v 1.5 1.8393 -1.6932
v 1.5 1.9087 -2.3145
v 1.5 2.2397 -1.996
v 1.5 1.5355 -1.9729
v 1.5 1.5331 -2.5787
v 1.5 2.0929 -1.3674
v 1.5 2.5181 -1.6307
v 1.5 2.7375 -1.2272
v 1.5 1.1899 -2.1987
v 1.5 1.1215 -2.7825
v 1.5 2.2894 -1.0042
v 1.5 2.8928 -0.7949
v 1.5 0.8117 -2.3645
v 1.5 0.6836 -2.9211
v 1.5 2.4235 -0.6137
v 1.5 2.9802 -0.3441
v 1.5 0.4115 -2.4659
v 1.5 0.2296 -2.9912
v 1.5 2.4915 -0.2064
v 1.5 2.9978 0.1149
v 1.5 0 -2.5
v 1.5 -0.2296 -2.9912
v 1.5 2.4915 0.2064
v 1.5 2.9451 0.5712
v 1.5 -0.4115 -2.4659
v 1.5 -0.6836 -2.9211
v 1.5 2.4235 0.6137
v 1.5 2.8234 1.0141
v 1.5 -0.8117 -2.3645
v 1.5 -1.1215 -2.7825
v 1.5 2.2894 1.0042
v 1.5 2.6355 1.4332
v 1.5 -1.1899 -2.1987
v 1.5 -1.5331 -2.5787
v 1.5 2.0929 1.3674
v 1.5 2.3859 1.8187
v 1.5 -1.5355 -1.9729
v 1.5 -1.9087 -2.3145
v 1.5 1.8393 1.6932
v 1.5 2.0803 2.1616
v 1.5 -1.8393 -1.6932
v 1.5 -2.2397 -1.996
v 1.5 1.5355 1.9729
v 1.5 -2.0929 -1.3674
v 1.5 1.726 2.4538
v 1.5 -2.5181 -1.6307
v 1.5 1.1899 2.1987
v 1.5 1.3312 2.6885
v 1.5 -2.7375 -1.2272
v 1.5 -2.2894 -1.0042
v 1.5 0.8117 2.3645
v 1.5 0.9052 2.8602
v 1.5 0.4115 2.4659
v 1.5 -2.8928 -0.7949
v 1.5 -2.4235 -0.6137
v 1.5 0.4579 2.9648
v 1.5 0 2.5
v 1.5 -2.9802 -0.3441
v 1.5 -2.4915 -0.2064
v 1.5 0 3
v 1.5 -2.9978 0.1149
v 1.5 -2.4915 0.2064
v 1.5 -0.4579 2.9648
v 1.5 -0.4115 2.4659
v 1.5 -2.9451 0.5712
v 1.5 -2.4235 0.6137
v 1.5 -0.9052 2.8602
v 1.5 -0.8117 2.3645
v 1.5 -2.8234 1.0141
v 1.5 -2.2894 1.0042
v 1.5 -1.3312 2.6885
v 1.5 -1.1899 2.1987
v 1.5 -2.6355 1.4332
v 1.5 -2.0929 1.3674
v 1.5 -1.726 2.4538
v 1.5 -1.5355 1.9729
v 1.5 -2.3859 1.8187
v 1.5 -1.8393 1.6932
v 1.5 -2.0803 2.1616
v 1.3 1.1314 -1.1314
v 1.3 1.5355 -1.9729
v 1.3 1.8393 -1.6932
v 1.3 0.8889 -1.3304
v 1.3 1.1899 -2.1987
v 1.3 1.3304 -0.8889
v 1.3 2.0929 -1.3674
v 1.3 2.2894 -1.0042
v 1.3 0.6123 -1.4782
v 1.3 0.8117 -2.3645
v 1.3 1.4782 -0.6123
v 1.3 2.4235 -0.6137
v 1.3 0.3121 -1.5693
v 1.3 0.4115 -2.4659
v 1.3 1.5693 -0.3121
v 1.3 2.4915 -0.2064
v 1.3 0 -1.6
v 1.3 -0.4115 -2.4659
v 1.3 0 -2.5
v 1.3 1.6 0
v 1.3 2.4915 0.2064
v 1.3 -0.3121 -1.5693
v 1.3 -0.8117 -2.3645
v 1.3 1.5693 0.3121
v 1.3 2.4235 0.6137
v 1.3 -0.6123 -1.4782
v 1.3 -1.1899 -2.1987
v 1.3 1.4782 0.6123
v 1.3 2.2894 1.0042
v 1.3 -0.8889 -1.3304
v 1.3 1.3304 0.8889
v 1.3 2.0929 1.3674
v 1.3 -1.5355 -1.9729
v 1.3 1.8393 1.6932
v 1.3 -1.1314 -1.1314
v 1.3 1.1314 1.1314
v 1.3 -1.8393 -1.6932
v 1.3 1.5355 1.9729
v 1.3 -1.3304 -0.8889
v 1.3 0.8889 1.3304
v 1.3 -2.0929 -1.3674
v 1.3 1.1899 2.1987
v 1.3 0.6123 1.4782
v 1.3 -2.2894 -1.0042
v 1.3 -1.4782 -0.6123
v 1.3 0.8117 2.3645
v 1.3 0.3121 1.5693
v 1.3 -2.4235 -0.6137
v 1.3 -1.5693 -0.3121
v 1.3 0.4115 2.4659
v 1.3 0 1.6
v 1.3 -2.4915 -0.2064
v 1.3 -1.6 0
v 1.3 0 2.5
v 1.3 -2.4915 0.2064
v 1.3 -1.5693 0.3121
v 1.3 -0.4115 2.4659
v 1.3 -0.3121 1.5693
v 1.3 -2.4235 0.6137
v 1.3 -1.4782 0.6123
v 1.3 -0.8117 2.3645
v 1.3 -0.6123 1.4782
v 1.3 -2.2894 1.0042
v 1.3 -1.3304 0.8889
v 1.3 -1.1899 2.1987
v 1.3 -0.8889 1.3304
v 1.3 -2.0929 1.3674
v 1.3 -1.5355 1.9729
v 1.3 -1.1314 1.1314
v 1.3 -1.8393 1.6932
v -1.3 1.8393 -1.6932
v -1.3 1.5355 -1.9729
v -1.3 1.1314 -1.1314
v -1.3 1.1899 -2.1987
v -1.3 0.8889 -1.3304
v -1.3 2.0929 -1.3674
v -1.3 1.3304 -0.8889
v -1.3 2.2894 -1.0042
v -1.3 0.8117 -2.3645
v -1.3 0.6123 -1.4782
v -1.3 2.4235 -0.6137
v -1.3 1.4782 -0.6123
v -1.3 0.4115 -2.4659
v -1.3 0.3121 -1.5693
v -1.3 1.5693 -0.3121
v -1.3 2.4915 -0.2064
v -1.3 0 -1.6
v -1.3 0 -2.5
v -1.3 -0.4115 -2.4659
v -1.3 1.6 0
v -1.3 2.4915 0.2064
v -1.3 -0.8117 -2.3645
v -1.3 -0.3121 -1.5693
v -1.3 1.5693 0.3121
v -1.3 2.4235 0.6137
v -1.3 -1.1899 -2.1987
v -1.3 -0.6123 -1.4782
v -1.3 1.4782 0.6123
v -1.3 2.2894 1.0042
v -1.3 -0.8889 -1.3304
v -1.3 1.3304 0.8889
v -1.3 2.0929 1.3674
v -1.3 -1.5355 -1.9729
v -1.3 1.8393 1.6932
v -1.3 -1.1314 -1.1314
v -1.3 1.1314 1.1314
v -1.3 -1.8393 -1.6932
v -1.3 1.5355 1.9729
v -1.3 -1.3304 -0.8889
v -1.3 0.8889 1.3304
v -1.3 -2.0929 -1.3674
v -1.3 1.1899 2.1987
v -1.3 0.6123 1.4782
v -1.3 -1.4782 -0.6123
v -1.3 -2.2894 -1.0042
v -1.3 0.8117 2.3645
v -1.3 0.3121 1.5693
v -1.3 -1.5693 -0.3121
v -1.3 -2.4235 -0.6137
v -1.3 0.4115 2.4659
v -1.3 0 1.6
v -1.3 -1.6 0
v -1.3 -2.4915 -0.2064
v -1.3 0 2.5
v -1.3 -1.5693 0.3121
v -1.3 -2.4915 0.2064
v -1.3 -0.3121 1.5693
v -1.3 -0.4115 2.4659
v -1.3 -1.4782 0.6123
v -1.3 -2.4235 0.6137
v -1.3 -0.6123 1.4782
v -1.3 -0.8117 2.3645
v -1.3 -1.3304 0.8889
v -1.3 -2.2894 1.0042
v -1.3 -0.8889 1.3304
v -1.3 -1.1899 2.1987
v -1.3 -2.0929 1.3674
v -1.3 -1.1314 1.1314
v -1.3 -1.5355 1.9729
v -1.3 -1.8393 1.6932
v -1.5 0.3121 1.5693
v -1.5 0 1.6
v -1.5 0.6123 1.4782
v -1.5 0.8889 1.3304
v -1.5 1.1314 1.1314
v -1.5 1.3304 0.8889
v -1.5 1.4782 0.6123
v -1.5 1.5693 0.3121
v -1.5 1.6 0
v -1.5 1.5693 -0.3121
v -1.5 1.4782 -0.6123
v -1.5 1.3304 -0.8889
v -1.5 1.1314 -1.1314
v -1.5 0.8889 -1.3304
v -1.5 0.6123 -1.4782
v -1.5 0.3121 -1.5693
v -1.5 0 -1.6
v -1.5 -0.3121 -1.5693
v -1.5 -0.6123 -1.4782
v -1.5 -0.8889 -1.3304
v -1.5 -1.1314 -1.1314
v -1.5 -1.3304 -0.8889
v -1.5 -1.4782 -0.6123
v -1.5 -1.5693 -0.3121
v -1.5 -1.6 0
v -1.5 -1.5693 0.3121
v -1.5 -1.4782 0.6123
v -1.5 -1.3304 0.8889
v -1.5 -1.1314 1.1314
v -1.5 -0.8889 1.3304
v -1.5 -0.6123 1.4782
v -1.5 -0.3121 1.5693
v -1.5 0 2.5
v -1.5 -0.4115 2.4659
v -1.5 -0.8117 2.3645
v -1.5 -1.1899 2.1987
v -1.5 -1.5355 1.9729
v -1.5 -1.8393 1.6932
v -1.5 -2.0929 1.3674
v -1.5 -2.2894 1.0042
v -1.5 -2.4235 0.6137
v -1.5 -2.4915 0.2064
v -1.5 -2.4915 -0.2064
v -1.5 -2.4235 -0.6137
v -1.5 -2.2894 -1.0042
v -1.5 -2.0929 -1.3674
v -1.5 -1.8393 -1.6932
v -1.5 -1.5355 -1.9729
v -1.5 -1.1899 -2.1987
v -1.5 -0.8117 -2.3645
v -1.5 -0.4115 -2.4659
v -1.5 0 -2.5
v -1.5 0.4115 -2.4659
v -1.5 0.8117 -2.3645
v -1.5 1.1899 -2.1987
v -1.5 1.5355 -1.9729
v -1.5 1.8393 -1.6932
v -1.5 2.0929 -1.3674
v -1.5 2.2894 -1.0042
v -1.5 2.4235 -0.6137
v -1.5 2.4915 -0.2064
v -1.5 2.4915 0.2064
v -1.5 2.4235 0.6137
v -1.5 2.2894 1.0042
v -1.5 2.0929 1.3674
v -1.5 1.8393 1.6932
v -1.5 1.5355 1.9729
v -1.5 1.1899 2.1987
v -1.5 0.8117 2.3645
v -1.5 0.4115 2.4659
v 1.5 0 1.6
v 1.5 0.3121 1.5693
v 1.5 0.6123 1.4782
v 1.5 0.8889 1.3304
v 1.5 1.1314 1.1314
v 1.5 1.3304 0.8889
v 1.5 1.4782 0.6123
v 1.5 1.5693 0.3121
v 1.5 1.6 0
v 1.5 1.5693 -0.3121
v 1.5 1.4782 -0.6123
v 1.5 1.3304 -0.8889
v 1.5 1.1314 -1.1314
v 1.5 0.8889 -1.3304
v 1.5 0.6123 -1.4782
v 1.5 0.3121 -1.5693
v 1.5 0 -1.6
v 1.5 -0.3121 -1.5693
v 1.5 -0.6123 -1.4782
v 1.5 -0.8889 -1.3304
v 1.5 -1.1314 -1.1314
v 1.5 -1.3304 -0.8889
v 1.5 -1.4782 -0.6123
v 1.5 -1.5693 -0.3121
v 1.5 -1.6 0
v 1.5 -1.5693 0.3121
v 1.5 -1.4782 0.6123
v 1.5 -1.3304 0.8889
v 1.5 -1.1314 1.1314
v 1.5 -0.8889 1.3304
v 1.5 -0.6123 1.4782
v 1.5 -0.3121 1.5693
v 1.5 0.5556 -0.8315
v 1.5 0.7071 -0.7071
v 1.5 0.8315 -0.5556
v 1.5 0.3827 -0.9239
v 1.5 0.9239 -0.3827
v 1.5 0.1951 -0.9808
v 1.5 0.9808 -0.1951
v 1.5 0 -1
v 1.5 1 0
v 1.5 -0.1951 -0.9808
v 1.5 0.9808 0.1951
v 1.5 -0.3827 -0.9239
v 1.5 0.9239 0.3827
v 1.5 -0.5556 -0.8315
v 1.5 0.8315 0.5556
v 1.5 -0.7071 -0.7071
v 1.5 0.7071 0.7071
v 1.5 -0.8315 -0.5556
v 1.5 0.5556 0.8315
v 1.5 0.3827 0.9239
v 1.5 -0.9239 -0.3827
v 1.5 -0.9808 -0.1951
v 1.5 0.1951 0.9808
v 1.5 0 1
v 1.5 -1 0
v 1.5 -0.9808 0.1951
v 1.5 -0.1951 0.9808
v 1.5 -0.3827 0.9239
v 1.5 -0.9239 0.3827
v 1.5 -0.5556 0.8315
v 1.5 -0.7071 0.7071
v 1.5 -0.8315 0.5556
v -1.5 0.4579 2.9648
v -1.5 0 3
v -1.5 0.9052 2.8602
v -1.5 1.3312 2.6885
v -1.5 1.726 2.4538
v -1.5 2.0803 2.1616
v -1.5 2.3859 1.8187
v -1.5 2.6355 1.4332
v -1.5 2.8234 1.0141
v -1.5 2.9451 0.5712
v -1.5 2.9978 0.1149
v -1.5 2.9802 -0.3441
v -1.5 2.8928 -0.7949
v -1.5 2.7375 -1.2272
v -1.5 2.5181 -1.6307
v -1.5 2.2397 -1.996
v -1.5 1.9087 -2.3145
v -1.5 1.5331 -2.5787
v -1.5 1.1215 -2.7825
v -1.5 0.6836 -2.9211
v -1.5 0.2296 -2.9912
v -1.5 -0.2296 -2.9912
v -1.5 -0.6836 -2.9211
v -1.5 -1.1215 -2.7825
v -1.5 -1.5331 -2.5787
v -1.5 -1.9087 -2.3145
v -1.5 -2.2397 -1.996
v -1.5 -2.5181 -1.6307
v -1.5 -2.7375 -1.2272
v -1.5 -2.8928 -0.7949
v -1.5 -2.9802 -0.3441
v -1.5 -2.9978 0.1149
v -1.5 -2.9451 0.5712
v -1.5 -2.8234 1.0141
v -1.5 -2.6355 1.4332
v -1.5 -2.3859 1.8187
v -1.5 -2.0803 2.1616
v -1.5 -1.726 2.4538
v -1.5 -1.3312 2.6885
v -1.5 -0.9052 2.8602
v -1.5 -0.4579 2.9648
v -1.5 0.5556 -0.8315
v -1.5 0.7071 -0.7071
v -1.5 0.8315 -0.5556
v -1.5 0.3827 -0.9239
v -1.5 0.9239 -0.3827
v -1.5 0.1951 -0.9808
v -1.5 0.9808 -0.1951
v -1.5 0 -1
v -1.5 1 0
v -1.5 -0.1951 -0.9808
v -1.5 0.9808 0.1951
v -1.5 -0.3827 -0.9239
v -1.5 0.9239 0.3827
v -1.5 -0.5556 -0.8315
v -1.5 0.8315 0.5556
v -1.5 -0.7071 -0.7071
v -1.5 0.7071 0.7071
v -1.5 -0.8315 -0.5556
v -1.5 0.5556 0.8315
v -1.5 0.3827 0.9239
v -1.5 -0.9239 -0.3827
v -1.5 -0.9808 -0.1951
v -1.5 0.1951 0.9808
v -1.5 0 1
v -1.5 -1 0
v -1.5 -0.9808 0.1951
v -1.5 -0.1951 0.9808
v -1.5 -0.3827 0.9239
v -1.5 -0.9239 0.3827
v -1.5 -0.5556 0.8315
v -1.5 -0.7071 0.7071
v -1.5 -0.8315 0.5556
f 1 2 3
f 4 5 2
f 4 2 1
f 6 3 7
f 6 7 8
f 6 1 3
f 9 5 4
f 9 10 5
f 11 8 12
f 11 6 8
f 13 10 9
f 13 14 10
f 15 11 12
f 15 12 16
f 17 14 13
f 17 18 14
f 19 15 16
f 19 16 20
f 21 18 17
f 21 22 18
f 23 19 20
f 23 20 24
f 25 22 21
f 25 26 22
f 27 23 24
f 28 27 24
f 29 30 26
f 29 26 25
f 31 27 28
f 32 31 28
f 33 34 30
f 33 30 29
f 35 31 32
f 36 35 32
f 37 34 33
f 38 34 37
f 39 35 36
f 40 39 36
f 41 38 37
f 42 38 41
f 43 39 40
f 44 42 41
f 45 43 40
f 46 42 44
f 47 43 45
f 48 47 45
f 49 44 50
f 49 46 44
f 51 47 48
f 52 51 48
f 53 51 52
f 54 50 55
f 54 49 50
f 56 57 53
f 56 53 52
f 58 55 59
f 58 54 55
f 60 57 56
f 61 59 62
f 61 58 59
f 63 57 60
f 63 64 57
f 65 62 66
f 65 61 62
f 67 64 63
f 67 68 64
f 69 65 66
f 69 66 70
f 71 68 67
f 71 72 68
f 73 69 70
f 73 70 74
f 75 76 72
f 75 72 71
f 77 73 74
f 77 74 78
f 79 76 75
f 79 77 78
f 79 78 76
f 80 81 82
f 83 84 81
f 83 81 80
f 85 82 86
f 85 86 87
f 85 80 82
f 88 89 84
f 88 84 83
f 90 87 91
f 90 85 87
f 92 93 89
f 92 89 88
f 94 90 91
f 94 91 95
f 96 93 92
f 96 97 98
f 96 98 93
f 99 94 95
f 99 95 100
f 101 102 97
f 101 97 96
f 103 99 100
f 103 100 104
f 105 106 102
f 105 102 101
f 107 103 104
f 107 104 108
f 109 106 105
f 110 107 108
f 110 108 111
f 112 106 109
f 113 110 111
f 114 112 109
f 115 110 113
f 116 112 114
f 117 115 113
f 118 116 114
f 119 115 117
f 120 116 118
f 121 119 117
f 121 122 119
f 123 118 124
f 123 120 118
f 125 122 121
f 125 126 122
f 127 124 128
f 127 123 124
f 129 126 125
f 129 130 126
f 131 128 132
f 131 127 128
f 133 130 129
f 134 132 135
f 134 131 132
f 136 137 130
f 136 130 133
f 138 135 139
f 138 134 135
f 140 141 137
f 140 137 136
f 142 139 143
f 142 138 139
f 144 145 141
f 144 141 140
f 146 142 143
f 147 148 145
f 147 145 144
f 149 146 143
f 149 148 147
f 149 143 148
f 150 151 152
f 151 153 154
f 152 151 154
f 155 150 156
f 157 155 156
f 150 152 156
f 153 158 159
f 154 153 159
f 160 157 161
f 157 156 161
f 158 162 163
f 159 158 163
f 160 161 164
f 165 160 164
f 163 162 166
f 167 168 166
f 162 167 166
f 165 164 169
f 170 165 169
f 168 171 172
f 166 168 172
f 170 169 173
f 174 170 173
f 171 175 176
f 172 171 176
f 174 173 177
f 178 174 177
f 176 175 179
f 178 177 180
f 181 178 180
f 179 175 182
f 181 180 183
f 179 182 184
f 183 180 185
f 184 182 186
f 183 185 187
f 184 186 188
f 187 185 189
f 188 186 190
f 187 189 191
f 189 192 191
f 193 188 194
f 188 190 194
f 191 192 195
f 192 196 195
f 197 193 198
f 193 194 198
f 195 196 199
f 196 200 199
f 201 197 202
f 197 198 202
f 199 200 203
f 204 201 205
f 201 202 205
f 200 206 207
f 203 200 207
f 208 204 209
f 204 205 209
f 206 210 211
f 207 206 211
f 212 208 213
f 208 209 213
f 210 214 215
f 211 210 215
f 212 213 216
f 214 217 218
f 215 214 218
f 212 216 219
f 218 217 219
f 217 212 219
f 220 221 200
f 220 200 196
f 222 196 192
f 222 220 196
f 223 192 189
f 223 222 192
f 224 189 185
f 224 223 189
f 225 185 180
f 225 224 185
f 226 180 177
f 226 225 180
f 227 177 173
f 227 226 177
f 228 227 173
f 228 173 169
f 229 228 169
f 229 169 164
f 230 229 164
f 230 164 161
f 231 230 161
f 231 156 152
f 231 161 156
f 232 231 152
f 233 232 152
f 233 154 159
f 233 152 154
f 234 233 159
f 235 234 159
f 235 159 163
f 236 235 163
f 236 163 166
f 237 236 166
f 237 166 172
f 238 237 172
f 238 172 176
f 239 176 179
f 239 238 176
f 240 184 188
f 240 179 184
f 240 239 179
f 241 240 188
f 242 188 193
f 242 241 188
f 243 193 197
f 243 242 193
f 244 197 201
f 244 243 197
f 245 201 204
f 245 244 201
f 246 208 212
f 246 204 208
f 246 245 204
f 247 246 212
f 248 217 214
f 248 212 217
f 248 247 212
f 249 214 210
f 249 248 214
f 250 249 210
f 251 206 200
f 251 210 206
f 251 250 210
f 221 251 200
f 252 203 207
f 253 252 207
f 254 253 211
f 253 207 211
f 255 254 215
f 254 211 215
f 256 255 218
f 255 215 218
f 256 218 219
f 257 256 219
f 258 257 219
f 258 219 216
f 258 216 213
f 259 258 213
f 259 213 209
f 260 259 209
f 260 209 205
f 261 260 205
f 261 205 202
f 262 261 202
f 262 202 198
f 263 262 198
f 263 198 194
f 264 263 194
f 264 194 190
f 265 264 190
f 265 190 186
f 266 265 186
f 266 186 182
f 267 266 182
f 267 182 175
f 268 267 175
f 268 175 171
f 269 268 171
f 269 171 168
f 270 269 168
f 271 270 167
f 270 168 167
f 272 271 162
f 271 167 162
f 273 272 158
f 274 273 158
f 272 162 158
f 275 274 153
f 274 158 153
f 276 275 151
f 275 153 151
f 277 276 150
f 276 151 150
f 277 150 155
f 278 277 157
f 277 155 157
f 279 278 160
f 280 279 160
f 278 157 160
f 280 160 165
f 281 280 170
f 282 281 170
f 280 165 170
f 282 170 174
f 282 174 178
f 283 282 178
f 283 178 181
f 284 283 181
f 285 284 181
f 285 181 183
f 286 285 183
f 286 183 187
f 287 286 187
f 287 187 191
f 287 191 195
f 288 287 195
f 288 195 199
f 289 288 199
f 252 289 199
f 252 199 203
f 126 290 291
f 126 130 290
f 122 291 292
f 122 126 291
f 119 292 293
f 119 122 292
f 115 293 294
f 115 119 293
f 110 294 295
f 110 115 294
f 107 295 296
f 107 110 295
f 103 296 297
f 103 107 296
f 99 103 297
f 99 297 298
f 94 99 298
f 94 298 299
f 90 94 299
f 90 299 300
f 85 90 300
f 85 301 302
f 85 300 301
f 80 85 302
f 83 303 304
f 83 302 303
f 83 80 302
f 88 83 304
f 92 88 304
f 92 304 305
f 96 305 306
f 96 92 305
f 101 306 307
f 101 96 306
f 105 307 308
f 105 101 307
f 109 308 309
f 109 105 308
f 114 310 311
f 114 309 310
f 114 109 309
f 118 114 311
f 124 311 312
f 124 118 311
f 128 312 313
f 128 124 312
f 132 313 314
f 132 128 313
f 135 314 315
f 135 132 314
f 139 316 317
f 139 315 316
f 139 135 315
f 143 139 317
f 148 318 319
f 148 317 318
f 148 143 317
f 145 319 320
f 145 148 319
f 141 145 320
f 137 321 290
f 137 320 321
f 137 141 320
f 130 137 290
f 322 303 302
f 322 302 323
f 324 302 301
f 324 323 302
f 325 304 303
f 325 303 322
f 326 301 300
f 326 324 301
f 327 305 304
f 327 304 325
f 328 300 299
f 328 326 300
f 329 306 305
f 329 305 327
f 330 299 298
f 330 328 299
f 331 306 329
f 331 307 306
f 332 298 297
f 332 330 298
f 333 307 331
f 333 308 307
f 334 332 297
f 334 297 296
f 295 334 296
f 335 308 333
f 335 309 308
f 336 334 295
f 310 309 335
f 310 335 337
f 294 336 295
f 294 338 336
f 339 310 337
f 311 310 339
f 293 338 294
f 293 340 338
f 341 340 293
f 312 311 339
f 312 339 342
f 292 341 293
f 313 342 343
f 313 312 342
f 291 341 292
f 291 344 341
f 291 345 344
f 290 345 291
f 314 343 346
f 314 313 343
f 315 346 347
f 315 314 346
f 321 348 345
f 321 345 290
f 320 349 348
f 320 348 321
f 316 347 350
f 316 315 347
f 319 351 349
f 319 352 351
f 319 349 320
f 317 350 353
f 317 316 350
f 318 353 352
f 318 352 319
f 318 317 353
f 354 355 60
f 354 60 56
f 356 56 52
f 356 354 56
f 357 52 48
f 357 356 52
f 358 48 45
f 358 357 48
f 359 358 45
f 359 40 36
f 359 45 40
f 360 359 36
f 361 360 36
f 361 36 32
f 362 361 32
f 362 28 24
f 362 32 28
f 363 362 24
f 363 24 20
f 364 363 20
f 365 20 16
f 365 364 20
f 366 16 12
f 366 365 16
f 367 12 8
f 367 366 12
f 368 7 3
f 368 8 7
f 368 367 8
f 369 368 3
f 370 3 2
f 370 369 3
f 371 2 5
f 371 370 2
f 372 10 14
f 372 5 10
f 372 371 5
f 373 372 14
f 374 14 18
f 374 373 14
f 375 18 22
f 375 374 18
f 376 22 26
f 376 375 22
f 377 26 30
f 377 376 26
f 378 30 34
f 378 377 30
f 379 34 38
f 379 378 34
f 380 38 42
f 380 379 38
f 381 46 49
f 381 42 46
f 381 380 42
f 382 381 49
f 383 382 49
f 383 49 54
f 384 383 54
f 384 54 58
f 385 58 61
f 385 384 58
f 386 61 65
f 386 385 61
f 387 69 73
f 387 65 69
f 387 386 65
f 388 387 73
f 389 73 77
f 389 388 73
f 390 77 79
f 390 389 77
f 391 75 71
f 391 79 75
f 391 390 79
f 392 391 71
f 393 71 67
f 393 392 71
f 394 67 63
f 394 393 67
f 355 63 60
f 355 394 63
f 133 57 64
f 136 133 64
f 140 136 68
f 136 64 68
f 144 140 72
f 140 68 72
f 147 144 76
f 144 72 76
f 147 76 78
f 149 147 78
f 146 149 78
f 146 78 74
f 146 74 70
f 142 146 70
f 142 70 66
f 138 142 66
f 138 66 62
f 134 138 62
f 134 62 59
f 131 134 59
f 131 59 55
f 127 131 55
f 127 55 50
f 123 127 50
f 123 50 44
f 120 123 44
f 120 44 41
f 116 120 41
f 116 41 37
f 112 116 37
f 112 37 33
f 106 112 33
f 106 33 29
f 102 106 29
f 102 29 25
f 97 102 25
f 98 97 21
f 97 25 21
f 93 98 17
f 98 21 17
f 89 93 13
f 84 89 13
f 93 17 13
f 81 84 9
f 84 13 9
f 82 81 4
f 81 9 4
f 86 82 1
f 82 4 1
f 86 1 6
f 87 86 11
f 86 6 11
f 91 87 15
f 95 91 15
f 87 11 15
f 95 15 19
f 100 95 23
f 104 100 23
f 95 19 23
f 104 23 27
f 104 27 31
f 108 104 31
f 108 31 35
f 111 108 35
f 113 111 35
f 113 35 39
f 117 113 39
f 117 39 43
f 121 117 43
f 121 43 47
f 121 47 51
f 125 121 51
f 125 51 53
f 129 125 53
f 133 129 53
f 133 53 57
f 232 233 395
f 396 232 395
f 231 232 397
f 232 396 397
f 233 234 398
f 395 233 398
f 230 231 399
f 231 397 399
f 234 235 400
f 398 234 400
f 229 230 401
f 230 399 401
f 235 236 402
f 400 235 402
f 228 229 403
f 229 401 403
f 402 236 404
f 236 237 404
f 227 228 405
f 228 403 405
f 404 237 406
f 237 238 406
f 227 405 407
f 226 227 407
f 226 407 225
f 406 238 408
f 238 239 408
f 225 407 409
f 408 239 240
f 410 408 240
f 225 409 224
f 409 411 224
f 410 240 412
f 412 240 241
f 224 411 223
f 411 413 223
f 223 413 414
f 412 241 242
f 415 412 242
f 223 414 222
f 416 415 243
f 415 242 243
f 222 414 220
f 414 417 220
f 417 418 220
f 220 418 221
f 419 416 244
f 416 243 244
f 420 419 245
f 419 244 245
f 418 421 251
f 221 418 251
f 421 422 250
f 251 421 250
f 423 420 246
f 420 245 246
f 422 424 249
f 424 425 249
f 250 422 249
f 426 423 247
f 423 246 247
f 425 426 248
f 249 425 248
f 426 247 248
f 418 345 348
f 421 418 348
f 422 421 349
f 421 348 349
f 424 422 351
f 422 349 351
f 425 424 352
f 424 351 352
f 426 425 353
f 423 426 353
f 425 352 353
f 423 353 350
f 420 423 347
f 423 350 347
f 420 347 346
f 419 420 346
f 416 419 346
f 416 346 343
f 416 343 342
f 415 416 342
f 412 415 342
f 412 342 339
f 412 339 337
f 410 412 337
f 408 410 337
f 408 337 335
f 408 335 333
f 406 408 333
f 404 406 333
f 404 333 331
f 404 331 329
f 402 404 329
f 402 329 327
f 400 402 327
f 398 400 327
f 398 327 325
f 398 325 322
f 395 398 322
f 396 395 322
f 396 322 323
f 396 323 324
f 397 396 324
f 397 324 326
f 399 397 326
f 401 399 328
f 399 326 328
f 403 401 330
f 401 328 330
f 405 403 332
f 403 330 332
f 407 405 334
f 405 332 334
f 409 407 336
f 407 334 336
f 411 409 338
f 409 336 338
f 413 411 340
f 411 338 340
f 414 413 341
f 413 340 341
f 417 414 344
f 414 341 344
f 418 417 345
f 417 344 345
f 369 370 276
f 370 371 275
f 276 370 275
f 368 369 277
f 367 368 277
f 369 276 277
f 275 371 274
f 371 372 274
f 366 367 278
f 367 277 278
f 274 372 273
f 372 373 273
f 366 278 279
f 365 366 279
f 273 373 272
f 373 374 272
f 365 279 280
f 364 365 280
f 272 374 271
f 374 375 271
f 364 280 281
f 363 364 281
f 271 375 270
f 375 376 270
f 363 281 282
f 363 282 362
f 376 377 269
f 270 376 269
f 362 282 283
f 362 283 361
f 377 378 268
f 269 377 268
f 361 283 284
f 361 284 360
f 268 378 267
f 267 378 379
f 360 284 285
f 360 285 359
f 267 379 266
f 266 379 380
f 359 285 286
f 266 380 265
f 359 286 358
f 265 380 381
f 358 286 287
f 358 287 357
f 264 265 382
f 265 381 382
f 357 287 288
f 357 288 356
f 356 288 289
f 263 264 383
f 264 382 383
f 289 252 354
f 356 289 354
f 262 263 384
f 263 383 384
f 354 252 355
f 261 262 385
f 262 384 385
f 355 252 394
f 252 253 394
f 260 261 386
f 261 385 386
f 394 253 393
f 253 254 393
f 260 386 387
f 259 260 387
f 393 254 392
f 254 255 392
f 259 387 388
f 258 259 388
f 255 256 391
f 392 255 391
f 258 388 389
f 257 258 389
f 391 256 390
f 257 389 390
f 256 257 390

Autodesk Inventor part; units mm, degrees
ref_plane "YZ Plane" through (0, 0, 0) normal (1, 0, 0) x (0, 1, 0)
ref_plane "XZ Plane" through (0, 0, 0) normal (0, 1, 0) x (-1, 0, 0)
ref_plane "XY Plane" through (0, 0, 0) normal (0, 0, 1) x (1, 0, 0)
sketch "Skizze1" plane through (0, 0, 0) normal (0, 1, 0) x (-1, 0, 0)
  line L0 (1.5, 0) -> (-1.5, 0)
  line L1 (1.5, 1) -> (-1.5, 1)
  line L2 (-1.5, 1) -> (-1.5, 1.6)
  line L3 (-1.5, 1.6) -> (-1.3, 1.6)
  line L4 (-1.3, 1.6) -> (-1.3, 2.5)
  line L5 (-1.3, 2.5) -> (-1.5, 2.5)
  line L6 (-1.5, 2.5) -> (-1.5, 3)
  line L7 (-1.5, 3) -> (1.5, 3)
  line L8 (1.5, 3) -> (1.5, 2.5)
  line L9 (1.5, 2.5) -> (1.3, 2.5)
  line L10 (1.3, 2.5) -> (1.3, 1.6)
  line L11 (1.3, 1.6) -> (1.5, 1.6)
  line L12 (1.5, 1) -> (1.5, 1.6)
  line L13 (0, -0.6) -> (0, 3.6) projected
  point P0 (0, 0)
  dimension "d0" = 2
  dimension "d1" = 6
  dimension "d2" = 3
  dimension "d3" = 0.2
  dimension "d4" = 0.6
  dimension "d5" = 0.5
revolve "Umdrehung1" add sketch "Skizze1" angle 360 about axis through (-1.5, 0, 0) along (1, 0, 0)
equation "\"d4\" = 0.1 * d1"
properties part number "Kugellager 692-ZZ" material "Stahl, weich, geschweißt"
